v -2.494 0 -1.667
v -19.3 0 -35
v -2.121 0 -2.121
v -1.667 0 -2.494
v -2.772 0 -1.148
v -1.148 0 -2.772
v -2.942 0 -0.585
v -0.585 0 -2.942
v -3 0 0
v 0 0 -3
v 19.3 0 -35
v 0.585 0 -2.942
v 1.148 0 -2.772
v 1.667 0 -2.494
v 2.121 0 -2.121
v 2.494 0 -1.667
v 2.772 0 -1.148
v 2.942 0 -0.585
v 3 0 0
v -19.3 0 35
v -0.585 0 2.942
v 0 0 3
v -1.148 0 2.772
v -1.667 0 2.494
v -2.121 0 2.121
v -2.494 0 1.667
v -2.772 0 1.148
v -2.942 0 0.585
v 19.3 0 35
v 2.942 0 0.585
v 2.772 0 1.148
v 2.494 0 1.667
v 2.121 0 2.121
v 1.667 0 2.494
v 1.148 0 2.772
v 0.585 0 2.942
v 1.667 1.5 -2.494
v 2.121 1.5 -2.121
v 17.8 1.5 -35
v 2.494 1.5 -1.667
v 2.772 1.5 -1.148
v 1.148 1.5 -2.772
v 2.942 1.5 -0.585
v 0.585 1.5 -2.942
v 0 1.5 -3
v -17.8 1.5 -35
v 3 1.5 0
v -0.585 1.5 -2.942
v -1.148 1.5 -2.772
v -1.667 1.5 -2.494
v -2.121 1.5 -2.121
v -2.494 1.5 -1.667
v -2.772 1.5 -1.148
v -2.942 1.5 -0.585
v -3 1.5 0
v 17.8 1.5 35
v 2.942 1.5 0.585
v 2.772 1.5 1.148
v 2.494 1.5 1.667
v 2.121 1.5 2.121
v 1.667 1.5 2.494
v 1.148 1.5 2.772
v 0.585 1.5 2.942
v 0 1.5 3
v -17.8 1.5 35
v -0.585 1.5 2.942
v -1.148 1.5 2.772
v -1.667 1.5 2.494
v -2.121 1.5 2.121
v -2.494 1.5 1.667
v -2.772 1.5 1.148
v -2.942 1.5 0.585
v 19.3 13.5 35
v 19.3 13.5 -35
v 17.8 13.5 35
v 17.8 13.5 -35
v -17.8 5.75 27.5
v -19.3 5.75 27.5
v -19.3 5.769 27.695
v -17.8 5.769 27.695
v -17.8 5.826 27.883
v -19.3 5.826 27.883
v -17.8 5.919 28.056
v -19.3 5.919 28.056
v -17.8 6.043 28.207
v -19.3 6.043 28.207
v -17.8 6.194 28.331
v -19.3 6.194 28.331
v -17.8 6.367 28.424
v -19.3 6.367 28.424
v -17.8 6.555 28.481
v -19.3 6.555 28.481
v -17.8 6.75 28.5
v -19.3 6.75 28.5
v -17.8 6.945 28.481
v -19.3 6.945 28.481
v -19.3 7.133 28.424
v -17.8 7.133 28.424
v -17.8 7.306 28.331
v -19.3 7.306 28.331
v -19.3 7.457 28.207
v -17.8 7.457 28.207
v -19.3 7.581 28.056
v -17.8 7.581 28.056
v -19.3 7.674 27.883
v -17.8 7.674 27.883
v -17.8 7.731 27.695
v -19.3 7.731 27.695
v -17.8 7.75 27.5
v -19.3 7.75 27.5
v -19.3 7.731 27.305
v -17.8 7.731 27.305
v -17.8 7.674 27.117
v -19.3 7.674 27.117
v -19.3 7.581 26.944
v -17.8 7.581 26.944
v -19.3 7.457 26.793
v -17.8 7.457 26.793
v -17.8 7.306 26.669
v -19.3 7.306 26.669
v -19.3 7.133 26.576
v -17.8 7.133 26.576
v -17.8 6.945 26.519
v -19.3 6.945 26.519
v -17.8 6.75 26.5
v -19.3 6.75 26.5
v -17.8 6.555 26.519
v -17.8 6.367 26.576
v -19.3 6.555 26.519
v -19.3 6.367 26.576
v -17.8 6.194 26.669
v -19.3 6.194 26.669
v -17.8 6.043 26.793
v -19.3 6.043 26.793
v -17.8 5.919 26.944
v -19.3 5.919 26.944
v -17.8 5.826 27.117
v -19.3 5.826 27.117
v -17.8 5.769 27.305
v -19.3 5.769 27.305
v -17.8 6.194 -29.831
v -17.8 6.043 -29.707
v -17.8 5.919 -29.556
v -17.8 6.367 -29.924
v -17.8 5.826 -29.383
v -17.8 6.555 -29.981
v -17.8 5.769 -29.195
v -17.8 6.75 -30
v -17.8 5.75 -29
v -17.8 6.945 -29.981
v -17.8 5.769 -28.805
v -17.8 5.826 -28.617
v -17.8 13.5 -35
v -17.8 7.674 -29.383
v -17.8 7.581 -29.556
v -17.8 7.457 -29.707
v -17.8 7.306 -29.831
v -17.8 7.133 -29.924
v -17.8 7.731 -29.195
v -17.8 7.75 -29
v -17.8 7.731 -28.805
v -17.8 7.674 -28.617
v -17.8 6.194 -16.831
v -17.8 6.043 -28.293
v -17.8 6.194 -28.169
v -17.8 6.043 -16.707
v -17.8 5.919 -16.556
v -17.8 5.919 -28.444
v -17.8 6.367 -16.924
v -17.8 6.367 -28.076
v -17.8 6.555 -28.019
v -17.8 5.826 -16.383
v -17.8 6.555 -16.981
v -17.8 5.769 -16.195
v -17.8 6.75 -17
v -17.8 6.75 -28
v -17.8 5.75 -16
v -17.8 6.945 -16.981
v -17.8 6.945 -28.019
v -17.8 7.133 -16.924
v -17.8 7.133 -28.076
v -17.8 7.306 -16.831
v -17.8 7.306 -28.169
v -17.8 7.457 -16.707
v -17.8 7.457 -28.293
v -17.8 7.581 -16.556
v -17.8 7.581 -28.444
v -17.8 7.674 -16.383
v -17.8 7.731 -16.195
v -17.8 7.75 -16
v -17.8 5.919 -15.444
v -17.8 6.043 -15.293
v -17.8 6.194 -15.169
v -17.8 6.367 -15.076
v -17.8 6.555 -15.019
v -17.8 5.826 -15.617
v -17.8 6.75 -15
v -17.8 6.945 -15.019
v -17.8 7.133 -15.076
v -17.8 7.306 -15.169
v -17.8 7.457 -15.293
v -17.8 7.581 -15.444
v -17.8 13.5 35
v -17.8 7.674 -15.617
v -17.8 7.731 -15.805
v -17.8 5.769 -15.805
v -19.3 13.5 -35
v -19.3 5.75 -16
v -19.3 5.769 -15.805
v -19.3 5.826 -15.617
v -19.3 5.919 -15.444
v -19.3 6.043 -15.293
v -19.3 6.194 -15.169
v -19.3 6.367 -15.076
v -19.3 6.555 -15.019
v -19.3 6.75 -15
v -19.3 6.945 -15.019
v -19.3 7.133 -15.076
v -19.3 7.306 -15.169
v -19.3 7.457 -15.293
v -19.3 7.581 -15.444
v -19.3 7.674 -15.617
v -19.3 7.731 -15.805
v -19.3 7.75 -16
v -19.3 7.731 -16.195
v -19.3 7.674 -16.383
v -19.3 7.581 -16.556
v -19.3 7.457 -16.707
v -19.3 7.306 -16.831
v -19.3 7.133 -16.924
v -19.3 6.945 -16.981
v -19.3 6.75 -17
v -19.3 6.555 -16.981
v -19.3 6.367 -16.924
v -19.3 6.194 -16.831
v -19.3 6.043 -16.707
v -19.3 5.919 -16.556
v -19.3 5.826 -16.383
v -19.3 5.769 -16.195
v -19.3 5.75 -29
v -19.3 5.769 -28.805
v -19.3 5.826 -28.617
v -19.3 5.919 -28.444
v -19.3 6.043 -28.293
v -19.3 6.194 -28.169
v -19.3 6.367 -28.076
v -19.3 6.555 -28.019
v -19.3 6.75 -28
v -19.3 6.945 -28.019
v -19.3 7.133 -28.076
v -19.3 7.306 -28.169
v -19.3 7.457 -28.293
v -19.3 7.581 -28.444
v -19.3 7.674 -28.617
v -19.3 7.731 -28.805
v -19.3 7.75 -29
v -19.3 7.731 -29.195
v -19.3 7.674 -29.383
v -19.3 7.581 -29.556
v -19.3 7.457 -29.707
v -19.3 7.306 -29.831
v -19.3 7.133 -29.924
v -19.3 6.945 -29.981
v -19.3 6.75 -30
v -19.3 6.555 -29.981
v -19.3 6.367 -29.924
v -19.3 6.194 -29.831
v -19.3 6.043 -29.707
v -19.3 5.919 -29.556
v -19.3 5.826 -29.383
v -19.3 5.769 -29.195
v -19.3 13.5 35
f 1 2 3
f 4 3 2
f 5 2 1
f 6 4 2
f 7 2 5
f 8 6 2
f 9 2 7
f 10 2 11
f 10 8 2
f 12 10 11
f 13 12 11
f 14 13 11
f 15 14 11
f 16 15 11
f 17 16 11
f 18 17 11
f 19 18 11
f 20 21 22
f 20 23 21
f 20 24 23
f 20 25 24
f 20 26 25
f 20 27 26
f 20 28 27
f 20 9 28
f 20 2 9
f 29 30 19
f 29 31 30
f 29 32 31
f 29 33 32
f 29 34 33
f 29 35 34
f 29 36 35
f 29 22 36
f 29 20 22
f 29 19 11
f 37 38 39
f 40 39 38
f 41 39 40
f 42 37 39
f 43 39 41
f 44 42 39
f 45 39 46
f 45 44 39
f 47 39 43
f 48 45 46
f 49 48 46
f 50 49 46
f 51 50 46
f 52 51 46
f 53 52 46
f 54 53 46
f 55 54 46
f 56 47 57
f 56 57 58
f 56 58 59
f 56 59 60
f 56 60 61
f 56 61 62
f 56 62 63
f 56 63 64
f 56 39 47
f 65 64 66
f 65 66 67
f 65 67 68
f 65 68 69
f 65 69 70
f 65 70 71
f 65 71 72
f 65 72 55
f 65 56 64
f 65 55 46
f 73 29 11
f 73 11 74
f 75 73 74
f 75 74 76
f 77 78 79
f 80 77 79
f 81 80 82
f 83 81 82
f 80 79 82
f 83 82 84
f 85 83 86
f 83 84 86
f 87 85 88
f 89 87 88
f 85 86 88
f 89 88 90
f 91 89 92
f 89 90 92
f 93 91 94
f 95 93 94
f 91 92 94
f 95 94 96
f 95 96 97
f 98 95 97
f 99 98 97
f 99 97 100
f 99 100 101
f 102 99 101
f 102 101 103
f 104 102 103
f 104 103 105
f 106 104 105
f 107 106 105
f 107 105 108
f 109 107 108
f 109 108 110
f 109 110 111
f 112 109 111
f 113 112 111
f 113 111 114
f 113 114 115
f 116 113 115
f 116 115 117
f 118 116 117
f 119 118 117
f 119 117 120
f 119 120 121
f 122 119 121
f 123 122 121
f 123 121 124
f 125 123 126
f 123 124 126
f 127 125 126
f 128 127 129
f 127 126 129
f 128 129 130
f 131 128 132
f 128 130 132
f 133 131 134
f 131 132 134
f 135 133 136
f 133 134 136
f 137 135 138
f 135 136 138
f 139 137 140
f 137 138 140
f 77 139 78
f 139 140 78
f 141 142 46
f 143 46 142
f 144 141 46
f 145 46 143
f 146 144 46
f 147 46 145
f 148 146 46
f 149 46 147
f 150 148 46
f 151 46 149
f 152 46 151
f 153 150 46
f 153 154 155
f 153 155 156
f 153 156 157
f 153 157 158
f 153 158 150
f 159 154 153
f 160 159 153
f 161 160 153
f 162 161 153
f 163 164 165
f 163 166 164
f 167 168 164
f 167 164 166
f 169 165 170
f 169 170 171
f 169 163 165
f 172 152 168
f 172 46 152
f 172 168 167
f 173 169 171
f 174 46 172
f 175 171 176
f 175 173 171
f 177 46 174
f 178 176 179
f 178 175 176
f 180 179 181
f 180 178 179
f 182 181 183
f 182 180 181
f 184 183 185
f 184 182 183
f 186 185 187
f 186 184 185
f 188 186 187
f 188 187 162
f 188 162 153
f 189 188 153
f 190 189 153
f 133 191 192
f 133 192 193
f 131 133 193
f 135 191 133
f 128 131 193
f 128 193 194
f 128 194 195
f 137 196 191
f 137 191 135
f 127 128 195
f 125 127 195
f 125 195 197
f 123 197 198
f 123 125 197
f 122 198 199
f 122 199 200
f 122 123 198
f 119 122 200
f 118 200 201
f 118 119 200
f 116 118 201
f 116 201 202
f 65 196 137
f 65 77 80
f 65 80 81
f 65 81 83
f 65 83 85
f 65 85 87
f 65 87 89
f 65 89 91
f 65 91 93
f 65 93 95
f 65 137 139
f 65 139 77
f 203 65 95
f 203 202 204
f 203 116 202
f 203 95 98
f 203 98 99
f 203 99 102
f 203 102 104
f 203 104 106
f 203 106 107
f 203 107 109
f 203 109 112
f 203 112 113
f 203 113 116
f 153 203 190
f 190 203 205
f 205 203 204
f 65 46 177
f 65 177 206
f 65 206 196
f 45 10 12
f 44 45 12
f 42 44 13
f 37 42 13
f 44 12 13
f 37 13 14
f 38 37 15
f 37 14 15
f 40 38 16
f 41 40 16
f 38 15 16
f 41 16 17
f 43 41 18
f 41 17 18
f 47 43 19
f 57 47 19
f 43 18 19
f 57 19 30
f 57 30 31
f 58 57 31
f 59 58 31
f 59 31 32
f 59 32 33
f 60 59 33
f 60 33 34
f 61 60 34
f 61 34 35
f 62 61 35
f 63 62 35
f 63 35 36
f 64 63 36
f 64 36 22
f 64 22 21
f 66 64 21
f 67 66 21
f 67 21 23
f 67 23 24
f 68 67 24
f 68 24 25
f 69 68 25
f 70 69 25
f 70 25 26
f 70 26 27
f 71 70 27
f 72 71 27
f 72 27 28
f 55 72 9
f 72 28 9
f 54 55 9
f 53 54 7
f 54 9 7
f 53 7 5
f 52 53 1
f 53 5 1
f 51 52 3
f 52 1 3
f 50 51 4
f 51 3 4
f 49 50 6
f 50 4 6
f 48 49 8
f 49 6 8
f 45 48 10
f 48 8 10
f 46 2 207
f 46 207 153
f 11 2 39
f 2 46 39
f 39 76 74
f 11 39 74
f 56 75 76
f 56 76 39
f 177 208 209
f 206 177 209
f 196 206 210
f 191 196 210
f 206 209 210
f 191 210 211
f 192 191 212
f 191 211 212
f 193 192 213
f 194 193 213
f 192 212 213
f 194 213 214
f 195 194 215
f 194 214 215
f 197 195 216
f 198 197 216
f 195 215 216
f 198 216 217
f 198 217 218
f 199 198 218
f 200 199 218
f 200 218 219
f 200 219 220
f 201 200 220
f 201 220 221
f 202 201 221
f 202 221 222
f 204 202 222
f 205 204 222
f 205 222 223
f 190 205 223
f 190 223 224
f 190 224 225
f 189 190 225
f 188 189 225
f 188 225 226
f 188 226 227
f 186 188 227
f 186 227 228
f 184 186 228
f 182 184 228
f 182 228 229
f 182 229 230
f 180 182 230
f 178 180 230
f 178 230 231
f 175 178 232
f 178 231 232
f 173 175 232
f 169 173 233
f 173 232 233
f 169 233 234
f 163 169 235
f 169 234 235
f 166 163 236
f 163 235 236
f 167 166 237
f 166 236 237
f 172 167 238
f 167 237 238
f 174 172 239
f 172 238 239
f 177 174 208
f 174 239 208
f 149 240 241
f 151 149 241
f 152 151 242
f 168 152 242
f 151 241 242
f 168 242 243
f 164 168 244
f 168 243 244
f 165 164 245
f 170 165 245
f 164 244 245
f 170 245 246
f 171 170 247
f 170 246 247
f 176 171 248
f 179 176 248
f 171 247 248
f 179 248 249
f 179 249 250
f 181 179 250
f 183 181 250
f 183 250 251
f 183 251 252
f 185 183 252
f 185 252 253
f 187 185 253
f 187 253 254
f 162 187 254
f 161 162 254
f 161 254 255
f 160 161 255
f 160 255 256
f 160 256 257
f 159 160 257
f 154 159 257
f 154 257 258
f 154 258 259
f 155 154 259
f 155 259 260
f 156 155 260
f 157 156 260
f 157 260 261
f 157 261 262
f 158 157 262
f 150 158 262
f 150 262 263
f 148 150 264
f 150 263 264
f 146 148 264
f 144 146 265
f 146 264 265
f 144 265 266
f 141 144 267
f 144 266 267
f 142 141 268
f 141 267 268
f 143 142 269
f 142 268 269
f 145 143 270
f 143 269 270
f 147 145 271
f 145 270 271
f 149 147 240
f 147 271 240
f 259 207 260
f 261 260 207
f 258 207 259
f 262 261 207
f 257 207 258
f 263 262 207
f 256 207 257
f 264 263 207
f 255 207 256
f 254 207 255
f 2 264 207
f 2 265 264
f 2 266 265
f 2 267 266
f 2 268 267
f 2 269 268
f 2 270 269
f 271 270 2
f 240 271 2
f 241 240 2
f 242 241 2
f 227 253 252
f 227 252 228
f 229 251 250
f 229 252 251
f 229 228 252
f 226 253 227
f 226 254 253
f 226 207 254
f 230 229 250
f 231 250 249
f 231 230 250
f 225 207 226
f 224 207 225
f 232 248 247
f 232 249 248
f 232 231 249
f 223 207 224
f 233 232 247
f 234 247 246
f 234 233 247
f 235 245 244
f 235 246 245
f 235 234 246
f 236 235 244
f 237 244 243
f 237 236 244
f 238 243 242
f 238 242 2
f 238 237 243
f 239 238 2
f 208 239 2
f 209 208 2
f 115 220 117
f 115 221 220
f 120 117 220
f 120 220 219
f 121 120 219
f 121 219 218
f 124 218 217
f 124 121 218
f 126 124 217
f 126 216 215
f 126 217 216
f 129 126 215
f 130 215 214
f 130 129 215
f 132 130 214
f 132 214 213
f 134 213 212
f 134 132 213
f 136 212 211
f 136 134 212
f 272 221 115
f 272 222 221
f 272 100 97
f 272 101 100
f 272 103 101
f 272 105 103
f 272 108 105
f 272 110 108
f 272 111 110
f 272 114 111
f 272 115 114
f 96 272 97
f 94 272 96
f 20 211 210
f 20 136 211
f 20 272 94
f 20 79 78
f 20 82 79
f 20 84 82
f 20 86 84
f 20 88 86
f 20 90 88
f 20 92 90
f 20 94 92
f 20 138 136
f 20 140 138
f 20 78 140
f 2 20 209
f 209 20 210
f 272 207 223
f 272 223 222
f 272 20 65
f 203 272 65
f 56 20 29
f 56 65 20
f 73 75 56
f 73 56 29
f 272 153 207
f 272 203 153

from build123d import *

# Parameters (mm, degrees)
BOSS_EXTRUDE1_DEPTH = 35
SKETCH2_R           = 3
CUT_EXTRUDE1_DEPTH  = 43.186964811
CUT_EXTRUDE3_REACH  = 55.826
SKETCH4_R           = 1


with BuildPart() as part:
    # Sketch1 → Boss-Extrude1 (new, symmetric)
    with BuildSketch(Plane.XY):
        Polygon((-19.3, 13.5), (-19.3, 0), (19.3, 0), (19.3, 13.5), (17.8, 13.5), (17.8, 1.5), (-17.8, 1.5), (-17.8, 13.5), align=None)
    extrude(amount=BOSS_EXTRUDE1_DEPTH, both=True)

    # Sketch2 → Cut-Extrude1 (cut, through all)
    with BuildSketch(Plane.XZ):
        with Locations(Location((0, 0, 0), (0, 0, 270))):
            Circle(SKETCH2_R)
    extrude(amount=-CUT_EXTRUDE1_DEPTH, mode=Mode.SUBTRACT)

    # Sketch4 → Cut-Extrude3 (cut, up to next)
    with BuildSketch(Plane.ZY.offset(19.3), mode=Mode.PRIVATE) as cut_extrude3_sk1:
        with Locations(Location((-29, 6.75, 0), (0, 0, 270))):
            Circle(SKETCH4_R)
    cut_extrude3_tool1 = extrude(cut_extrude3_sk1.sketch, amount=-CUT_EXTRUDE3_REACH, mode=Mode.PRIVATE) & part.part
    # Sketch4 → Cut-Extrude3 (cut, up to next)
    with BuildSketch(Plane.ZY.offset(19.3), mode=Mode.PRIVATE) as cut_extrude3_sk2:
        with Locations(Location((-16, 6.75, 0), (0, 0, 270))):
            Circle(SKETCH4_R)
    cut_extrude3_tool2 = extrude(cut_extrude3_sk2.sketch, amount=-CUT_EXTRUDE3_REACH, mode=Mode.PRIVATE) & part.part
    # Sketch4 → Cut-Extrude3 (cut, up to next)
    with BuildSketch(Plane.ZY.offset(19.3), mode=Mode.PRIVATE) as cut_extrude3_sk3:
        with Locations(Location((27.5, 6.75, 0), (0, 0, 270))):
            Circle(SKETCH4_R)
    cut_extrude3_tool3 = extrude(cut_extrude3_sk3.sketch, amount=-CUT_EXTRUDE3_REACH, mode=Mode.PRIVATE) & part.part
    add(cut_extrude3_tool1.solids().sort_by_distance((-19.3, 6.75, -29))[0], mode=Mode.SUBTRACT)
    add(cut_extrude3_tool2.solids().sort_by_distance((-19.3, 6.75, -16))[0], mode=Mode.SUBTRACT)
    add(cut_extrude3_tool3.solids().sort_by_distance((-19.3, 6.75, 27.5))[0], mode=Mode.SUBTRACT)


solid = part.part
